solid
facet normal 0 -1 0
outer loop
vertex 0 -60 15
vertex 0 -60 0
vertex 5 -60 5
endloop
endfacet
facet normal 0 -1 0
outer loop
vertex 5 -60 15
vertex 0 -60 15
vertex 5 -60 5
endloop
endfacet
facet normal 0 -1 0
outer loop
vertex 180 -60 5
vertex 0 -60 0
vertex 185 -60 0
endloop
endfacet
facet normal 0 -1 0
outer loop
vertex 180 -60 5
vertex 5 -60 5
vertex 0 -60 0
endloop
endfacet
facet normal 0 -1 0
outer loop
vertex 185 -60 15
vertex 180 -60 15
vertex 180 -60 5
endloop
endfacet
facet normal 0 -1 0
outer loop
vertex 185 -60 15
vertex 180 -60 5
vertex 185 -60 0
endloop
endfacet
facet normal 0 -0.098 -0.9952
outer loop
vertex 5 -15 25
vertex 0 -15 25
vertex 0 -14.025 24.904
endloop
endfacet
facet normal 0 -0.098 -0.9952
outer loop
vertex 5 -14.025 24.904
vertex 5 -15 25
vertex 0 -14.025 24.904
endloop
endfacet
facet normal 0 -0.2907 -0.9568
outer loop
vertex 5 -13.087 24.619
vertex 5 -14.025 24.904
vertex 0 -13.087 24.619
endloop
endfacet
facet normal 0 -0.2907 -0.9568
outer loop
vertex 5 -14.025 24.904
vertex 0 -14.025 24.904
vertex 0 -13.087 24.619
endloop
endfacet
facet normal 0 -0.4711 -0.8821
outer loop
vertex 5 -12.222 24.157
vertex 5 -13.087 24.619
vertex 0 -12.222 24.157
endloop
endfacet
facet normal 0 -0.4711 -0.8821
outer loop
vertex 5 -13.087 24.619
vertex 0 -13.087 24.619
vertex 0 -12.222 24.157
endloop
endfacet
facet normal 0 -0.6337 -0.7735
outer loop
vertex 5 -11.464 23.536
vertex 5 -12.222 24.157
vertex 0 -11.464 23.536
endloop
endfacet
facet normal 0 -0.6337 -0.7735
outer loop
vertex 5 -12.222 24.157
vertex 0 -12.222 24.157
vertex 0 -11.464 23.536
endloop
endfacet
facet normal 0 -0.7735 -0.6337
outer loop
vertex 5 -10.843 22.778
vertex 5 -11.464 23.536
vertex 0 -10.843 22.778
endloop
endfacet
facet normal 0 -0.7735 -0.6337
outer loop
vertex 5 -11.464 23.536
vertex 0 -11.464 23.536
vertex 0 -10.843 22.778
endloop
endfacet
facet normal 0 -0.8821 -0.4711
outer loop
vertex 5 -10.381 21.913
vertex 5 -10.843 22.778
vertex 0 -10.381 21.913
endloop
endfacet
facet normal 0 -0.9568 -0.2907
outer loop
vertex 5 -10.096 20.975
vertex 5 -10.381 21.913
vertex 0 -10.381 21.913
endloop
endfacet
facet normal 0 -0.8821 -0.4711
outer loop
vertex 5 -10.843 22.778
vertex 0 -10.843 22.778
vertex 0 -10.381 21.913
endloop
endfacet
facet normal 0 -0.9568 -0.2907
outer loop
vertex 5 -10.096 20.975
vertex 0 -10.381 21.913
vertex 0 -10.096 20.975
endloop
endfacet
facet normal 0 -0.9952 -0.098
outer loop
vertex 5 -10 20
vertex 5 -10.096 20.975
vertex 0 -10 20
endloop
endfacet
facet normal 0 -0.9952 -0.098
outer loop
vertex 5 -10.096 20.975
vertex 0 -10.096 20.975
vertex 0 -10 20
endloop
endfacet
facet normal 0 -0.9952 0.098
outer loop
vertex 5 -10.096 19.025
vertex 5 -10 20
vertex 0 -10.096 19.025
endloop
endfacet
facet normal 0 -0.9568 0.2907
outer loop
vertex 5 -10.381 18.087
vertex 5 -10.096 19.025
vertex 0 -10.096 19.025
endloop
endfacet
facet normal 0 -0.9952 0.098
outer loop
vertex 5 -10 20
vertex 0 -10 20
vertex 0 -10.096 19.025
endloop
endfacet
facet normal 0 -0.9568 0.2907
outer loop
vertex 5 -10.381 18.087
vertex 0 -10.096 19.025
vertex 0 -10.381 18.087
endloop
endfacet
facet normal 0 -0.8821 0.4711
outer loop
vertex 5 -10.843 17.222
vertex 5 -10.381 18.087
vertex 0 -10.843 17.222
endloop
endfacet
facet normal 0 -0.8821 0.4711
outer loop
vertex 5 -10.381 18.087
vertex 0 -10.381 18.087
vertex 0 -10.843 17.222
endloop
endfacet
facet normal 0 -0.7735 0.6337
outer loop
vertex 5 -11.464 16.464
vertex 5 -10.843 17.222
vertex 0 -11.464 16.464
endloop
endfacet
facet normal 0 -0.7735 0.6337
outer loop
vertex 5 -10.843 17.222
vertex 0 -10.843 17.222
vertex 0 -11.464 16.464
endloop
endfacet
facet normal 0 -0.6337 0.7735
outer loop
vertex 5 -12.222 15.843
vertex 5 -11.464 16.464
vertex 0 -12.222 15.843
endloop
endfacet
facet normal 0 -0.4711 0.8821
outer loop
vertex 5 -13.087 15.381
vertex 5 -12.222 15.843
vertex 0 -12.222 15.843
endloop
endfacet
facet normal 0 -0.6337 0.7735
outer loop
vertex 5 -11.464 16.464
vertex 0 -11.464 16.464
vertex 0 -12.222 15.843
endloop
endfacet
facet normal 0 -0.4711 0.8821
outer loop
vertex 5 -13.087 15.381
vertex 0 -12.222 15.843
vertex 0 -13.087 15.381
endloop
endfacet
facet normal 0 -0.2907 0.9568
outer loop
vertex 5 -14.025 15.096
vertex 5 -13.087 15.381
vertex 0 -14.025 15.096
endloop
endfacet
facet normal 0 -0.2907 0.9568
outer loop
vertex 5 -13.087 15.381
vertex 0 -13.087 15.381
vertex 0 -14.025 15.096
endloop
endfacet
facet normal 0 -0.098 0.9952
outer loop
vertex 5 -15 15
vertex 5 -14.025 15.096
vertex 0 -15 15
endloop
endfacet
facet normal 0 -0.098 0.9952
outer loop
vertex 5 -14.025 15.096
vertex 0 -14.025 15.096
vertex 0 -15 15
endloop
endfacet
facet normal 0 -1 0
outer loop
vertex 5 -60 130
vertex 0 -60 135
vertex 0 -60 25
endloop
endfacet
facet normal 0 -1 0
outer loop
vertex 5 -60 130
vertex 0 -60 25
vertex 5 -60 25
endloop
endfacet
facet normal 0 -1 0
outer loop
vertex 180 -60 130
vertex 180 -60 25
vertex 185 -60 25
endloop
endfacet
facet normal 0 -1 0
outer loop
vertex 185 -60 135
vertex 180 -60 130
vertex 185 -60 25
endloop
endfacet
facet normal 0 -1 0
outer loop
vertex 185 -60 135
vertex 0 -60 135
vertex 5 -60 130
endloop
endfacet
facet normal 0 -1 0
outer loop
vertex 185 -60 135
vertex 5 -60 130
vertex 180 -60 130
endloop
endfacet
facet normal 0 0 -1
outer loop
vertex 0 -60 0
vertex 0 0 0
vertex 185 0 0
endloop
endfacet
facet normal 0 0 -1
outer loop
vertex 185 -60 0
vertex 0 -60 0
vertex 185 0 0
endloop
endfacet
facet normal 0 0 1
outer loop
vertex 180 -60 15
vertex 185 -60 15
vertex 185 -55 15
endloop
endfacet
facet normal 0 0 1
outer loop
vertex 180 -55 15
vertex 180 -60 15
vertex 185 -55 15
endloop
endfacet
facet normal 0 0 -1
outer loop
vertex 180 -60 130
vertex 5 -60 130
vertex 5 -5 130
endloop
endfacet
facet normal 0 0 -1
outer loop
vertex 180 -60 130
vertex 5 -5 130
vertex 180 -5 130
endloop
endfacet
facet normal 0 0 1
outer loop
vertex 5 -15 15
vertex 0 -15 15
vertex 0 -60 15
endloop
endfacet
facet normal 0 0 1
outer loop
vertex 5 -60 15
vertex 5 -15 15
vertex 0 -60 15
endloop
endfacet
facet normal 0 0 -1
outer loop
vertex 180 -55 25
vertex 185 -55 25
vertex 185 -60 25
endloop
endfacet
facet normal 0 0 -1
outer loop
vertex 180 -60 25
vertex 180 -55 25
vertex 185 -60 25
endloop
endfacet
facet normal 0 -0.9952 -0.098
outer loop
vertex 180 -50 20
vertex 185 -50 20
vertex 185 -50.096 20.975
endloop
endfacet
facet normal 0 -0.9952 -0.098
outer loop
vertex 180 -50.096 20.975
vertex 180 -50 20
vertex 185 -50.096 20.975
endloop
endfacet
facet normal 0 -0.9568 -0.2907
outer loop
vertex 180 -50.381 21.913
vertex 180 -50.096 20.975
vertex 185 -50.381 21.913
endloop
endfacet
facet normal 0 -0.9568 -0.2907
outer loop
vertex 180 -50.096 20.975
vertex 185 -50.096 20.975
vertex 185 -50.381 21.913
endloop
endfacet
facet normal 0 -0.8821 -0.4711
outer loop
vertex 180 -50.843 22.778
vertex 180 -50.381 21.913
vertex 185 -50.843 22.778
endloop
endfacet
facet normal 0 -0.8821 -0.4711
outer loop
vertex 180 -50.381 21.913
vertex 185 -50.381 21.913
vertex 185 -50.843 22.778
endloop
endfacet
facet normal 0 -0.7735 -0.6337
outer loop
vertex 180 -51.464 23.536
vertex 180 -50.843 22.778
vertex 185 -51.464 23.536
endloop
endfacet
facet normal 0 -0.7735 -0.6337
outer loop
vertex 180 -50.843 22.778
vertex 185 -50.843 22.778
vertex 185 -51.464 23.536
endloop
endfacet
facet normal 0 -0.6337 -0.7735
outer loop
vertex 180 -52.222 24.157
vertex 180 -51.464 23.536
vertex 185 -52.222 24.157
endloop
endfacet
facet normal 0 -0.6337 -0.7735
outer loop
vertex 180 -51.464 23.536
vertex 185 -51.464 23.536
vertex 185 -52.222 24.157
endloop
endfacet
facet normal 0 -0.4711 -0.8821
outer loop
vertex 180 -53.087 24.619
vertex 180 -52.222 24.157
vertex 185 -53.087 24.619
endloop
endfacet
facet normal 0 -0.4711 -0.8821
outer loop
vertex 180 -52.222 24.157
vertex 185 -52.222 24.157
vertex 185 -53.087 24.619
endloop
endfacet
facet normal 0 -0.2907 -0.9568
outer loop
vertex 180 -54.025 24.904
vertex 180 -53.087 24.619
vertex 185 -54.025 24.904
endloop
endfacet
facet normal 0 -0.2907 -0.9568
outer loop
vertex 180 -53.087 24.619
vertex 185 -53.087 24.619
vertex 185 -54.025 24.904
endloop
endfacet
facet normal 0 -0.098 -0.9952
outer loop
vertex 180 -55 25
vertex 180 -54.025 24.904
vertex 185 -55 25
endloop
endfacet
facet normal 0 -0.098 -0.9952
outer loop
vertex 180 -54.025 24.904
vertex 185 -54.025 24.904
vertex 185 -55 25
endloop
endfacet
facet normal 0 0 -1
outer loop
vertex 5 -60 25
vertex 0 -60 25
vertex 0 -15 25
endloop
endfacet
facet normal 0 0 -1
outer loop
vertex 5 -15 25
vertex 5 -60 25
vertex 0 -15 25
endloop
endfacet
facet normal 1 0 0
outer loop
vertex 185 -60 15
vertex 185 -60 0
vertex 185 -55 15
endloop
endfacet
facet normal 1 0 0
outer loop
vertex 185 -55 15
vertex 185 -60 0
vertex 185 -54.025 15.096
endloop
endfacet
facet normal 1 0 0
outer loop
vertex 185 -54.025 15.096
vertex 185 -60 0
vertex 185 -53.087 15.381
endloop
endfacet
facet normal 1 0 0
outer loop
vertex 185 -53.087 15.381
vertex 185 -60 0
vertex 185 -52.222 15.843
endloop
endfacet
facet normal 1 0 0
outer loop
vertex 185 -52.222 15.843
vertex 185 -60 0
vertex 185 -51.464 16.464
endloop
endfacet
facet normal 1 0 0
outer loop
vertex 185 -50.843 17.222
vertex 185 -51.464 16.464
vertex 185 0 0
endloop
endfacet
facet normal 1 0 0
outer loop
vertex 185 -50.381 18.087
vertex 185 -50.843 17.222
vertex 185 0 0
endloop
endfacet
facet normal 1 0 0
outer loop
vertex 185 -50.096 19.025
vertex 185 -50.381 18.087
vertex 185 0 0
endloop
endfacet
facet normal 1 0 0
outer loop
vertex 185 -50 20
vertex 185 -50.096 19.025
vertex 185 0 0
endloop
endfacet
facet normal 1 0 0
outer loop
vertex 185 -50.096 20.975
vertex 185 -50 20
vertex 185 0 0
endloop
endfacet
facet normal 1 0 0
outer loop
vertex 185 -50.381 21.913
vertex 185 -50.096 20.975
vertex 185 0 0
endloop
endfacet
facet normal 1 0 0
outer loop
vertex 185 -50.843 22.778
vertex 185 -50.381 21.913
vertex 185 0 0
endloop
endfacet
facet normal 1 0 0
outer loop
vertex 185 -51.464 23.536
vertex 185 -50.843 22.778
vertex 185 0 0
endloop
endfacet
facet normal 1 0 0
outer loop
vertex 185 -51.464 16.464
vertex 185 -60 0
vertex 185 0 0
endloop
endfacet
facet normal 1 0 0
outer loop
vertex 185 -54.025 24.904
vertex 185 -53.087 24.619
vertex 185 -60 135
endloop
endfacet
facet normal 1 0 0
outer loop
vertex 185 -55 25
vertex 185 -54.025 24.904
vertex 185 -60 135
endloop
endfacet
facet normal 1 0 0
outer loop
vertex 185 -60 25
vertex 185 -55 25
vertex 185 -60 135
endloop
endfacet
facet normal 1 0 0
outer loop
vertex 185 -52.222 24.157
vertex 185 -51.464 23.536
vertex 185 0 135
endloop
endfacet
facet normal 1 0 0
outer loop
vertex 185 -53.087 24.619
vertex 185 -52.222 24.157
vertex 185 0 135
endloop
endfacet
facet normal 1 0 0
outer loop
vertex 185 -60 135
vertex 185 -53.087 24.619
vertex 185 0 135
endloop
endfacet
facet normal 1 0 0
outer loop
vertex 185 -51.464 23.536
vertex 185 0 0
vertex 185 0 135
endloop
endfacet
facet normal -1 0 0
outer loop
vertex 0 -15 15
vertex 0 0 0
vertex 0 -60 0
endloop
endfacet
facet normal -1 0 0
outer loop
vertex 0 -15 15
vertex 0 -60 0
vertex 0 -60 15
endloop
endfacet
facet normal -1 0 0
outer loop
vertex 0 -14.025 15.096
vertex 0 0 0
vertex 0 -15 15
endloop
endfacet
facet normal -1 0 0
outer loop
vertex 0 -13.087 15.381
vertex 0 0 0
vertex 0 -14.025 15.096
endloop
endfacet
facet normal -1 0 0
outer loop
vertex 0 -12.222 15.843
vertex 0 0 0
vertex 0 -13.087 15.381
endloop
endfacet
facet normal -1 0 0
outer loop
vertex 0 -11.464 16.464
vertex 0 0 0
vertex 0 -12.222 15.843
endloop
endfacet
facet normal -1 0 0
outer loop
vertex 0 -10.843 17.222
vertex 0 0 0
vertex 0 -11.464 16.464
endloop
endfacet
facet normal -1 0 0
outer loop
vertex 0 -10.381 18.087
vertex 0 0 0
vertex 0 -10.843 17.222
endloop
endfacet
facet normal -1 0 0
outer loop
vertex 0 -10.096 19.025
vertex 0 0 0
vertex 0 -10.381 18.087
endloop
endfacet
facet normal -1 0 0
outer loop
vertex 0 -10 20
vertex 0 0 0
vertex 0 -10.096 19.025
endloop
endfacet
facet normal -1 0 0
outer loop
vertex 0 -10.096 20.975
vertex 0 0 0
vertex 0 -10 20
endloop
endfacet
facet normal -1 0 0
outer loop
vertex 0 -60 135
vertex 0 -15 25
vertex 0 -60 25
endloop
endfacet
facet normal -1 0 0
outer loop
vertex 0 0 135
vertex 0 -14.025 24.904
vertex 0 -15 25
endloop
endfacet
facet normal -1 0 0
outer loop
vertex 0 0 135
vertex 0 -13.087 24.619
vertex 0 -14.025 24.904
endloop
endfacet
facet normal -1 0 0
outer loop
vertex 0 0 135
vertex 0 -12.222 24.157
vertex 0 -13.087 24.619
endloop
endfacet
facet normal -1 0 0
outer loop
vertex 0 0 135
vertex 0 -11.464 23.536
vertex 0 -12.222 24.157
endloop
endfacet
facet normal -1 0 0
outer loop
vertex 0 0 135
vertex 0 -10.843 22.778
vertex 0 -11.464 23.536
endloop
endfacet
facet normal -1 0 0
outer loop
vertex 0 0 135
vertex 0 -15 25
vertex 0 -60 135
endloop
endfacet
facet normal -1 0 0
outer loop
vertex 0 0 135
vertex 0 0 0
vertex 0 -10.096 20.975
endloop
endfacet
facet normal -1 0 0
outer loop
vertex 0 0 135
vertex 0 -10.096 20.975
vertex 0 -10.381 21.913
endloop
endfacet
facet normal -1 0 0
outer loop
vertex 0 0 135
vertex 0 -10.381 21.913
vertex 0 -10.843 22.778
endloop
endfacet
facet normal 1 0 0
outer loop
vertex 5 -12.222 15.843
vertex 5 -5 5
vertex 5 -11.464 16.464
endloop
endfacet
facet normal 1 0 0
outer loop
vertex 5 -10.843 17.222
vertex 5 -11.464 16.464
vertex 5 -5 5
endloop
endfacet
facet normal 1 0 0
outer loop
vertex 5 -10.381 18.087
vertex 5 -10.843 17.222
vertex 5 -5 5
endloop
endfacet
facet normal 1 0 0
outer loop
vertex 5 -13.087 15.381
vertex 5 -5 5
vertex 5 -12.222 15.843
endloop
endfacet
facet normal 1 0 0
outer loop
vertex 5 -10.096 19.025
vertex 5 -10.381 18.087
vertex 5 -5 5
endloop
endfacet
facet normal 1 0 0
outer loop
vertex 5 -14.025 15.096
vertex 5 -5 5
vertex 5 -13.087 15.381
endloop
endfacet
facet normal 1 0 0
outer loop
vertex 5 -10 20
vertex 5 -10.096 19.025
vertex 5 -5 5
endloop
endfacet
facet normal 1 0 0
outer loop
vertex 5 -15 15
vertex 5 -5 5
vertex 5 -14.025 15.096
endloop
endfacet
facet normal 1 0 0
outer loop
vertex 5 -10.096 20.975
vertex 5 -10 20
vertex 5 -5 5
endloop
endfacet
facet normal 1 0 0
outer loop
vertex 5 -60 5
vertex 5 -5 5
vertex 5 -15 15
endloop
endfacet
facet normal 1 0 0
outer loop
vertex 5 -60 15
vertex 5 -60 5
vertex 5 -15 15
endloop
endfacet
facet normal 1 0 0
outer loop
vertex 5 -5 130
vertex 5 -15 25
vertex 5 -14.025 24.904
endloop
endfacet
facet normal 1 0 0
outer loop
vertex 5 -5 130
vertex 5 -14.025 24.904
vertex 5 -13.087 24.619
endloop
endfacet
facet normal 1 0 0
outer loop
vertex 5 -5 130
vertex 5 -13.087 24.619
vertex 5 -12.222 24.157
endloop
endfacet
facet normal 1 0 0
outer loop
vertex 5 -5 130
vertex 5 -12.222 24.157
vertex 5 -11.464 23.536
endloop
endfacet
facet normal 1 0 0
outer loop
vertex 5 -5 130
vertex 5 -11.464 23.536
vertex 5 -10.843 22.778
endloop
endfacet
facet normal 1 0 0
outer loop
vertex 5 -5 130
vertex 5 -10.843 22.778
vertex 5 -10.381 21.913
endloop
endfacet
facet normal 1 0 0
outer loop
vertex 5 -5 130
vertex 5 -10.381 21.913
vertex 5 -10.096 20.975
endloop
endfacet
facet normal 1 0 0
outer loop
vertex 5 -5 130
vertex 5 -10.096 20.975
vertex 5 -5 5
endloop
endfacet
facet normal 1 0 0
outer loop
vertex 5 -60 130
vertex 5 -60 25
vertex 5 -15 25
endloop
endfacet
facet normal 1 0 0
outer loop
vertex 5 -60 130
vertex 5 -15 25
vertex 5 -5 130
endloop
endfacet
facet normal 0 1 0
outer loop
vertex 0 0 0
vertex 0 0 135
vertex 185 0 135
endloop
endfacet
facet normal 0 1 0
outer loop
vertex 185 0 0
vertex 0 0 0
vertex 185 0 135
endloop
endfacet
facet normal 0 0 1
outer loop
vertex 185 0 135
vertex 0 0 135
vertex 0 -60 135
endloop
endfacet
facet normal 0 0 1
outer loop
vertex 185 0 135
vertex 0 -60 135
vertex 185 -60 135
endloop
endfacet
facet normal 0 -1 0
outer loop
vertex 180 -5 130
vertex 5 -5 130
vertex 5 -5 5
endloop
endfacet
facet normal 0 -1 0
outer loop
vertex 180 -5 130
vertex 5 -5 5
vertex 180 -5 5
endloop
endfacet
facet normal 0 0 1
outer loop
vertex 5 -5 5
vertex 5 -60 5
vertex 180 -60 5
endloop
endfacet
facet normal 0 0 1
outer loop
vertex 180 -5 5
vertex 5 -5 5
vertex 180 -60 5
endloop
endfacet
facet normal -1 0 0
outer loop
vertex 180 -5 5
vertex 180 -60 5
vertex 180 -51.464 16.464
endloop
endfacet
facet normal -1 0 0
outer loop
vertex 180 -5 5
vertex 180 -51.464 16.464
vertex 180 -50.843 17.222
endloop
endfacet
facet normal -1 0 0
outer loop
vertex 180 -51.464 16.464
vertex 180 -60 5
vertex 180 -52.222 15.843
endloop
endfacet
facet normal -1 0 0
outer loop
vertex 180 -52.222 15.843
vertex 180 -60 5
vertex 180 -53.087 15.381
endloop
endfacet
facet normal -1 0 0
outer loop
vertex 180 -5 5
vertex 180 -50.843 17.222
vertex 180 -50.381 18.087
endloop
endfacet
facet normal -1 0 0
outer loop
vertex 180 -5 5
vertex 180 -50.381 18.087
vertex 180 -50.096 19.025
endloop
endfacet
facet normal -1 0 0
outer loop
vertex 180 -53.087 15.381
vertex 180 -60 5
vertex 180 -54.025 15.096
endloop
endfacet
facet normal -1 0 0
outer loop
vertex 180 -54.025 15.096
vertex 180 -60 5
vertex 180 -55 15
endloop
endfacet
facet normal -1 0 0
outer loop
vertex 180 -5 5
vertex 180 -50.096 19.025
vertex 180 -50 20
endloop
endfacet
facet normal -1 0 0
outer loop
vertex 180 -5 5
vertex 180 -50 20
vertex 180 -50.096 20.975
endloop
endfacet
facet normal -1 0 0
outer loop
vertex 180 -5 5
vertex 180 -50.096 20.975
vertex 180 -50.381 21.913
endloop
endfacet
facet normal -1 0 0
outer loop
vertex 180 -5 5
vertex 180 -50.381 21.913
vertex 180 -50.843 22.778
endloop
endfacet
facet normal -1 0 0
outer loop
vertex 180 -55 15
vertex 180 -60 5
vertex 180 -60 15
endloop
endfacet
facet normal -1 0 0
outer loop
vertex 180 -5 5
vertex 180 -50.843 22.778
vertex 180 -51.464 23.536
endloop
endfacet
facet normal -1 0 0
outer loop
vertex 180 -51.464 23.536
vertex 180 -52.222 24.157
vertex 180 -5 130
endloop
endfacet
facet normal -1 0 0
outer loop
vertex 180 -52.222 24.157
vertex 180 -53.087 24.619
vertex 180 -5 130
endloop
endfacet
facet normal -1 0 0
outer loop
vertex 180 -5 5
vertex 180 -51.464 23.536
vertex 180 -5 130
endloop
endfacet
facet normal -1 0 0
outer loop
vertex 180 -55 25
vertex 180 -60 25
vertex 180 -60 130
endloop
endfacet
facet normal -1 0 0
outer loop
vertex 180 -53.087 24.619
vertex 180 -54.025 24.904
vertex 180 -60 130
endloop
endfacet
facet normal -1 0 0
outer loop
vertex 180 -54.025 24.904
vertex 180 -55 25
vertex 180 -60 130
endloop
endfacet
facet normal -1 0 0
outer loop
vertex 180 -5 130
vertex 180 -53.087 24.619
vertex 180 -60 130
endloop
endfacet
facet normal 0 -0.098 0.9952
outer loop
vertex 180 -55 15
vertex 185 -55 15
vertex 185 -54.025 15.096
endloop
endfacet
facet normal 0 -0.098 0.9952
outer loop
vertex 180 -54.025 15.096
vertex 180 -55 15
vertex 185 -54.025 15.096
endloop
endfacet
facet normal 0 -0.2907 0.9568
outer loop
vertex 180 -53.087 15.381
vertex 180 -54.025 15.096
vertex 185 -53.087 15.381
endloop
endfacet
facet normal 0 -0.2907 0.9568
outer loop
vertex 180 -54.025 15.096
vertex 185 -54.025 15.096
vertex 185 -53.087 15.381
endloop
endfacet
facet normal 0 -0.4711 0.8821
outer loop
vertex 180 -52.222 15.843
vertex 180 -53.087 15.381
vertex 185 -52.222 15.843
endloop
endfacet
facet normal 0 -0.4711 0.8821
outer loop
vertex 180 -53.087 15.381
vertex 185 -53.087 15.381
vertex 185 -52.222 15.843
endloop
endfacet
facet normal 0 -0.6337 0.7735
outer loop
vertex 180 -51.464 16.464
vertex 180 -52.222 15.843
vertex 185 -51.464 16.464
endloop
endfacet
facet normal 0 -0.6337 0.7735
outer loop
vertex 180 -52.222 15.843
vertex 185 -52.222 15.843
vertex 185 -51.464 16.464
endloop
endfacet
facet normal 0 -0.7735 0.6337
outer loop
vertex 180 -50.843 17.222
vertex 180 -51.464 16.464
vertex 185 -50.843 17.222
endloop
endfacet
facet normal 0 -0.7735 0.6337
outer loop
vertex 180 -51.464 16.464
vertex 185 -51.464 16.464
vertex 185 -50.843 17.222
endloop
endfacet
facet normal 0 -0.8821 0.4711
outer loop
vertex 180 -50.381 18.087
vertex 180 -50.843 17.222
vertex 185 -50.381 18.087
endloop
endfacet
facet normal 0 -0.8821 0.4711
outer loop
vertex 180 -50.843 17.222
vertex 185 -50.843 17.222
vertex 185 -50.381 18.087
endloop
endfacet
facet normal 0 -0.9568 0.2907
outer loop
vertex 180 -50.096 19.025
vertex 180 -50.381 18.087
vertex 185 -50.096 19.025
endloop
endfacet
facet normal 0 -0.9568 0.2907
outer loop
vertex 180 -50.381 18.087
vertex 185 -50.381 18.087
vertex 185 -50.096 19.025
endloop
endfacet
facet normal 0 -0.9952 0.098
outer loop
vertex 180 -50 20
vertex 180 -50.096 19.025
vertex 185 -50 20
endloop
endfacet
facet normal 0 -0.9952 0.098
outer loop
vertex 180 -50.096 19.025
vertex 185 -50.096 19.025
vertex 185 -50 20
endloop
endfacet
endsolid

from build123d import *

# Parameters (mm, degrees)
F0_W     = 185
F0_H     = 135
F1_DEPTH = 60
F2_W     = 175
F2_H     = 125
F3_DEPTH = 55
F5_DEPTH = 25
F7_DEPTH = 25


with BuildPart() as f1:
    # F0 (on Front) → F1 (new body)
    with BuildSketch(Plane.XZ):
        with Locations((92.5, 67.5)):
            Rectangle(F0_W, F0_H)
    extrude(amount=F1_DEPTH)

    # F2 (on face) → F3 (cut)
    with BuildSketch(Plane.XZ.offset(60)):
        with Locations((92.5, 67.5)):
            Rectangle(F2_W, F2_H)
    extrude(amount=-F3_DEPTH, mode=Mode.SUBTRACT)

    # F4 (on face) → F5 (cut)
    with BuildSketch(Plane.YZ.offset(185)):
        with BuildLine():
            ThreePointArc((-55, 15), (-51.4644660941, 16.4644660941), (-50, 20))
            ThreePointArc((-50, 20), (-51.4644660941, 23.5355339059), (-55, 25))
            Line((-55, 25), (-55, 15))
        make_face()
        with BuildLine():
            Line((-55, 15), (-55, 25))
            ThreePointArc((-55, 25), (-60, 20), (-55, 15))
        make_face()
        with BuildLine():
            ThreePointArc((-55, 15), (-60, 20), (-55, 25))
            Line((-55, 25), (-65, 25))
            Line((-65, 25), (-65, 15))
            Line((-65, 15), (-55, 15))
        make_face()
    extrude(amount=-F5_DEPTH, mode=Mode.SUBTRACT)

    # F6 (on face) → F7 (cut)
    with BuildSketch(Plane(origin=(0, 0, 0), x_dir=(0, -1, 0), z_dir=(-1, 0, 0))):
        with BuildLine():
            Line((60, 15), (60, 25))
            Line((60, 25), (15, 25))
            ThreePointArc((15, 25), (18.5355339059, 23.5355339059), (20, 20))
            ThreePointArc((20, 20), (18.5355339059, 16.4644660941), (15, 15))
            Line((15, 15), (60, 15))
        make_face()
        with BuildLine():
            ThreePointArc((20, 20), (18.5355339059, 23.5355339059), (15, 25))
            Line((15, 25), (15, 15))
            ThreePointArc((15, 15), (18.5355339059, 16.4644660941), (20, 20))
        make_face()
        with BuildLine():
            Line((15, 15), (15, 25))
            ThreePointArc((15, 25), (10, 20), (15, 15))
        make_face()
    extrude(amount=-F7_DEPTH, mode=Mode.SUBTRACT)


solid = f1.part
